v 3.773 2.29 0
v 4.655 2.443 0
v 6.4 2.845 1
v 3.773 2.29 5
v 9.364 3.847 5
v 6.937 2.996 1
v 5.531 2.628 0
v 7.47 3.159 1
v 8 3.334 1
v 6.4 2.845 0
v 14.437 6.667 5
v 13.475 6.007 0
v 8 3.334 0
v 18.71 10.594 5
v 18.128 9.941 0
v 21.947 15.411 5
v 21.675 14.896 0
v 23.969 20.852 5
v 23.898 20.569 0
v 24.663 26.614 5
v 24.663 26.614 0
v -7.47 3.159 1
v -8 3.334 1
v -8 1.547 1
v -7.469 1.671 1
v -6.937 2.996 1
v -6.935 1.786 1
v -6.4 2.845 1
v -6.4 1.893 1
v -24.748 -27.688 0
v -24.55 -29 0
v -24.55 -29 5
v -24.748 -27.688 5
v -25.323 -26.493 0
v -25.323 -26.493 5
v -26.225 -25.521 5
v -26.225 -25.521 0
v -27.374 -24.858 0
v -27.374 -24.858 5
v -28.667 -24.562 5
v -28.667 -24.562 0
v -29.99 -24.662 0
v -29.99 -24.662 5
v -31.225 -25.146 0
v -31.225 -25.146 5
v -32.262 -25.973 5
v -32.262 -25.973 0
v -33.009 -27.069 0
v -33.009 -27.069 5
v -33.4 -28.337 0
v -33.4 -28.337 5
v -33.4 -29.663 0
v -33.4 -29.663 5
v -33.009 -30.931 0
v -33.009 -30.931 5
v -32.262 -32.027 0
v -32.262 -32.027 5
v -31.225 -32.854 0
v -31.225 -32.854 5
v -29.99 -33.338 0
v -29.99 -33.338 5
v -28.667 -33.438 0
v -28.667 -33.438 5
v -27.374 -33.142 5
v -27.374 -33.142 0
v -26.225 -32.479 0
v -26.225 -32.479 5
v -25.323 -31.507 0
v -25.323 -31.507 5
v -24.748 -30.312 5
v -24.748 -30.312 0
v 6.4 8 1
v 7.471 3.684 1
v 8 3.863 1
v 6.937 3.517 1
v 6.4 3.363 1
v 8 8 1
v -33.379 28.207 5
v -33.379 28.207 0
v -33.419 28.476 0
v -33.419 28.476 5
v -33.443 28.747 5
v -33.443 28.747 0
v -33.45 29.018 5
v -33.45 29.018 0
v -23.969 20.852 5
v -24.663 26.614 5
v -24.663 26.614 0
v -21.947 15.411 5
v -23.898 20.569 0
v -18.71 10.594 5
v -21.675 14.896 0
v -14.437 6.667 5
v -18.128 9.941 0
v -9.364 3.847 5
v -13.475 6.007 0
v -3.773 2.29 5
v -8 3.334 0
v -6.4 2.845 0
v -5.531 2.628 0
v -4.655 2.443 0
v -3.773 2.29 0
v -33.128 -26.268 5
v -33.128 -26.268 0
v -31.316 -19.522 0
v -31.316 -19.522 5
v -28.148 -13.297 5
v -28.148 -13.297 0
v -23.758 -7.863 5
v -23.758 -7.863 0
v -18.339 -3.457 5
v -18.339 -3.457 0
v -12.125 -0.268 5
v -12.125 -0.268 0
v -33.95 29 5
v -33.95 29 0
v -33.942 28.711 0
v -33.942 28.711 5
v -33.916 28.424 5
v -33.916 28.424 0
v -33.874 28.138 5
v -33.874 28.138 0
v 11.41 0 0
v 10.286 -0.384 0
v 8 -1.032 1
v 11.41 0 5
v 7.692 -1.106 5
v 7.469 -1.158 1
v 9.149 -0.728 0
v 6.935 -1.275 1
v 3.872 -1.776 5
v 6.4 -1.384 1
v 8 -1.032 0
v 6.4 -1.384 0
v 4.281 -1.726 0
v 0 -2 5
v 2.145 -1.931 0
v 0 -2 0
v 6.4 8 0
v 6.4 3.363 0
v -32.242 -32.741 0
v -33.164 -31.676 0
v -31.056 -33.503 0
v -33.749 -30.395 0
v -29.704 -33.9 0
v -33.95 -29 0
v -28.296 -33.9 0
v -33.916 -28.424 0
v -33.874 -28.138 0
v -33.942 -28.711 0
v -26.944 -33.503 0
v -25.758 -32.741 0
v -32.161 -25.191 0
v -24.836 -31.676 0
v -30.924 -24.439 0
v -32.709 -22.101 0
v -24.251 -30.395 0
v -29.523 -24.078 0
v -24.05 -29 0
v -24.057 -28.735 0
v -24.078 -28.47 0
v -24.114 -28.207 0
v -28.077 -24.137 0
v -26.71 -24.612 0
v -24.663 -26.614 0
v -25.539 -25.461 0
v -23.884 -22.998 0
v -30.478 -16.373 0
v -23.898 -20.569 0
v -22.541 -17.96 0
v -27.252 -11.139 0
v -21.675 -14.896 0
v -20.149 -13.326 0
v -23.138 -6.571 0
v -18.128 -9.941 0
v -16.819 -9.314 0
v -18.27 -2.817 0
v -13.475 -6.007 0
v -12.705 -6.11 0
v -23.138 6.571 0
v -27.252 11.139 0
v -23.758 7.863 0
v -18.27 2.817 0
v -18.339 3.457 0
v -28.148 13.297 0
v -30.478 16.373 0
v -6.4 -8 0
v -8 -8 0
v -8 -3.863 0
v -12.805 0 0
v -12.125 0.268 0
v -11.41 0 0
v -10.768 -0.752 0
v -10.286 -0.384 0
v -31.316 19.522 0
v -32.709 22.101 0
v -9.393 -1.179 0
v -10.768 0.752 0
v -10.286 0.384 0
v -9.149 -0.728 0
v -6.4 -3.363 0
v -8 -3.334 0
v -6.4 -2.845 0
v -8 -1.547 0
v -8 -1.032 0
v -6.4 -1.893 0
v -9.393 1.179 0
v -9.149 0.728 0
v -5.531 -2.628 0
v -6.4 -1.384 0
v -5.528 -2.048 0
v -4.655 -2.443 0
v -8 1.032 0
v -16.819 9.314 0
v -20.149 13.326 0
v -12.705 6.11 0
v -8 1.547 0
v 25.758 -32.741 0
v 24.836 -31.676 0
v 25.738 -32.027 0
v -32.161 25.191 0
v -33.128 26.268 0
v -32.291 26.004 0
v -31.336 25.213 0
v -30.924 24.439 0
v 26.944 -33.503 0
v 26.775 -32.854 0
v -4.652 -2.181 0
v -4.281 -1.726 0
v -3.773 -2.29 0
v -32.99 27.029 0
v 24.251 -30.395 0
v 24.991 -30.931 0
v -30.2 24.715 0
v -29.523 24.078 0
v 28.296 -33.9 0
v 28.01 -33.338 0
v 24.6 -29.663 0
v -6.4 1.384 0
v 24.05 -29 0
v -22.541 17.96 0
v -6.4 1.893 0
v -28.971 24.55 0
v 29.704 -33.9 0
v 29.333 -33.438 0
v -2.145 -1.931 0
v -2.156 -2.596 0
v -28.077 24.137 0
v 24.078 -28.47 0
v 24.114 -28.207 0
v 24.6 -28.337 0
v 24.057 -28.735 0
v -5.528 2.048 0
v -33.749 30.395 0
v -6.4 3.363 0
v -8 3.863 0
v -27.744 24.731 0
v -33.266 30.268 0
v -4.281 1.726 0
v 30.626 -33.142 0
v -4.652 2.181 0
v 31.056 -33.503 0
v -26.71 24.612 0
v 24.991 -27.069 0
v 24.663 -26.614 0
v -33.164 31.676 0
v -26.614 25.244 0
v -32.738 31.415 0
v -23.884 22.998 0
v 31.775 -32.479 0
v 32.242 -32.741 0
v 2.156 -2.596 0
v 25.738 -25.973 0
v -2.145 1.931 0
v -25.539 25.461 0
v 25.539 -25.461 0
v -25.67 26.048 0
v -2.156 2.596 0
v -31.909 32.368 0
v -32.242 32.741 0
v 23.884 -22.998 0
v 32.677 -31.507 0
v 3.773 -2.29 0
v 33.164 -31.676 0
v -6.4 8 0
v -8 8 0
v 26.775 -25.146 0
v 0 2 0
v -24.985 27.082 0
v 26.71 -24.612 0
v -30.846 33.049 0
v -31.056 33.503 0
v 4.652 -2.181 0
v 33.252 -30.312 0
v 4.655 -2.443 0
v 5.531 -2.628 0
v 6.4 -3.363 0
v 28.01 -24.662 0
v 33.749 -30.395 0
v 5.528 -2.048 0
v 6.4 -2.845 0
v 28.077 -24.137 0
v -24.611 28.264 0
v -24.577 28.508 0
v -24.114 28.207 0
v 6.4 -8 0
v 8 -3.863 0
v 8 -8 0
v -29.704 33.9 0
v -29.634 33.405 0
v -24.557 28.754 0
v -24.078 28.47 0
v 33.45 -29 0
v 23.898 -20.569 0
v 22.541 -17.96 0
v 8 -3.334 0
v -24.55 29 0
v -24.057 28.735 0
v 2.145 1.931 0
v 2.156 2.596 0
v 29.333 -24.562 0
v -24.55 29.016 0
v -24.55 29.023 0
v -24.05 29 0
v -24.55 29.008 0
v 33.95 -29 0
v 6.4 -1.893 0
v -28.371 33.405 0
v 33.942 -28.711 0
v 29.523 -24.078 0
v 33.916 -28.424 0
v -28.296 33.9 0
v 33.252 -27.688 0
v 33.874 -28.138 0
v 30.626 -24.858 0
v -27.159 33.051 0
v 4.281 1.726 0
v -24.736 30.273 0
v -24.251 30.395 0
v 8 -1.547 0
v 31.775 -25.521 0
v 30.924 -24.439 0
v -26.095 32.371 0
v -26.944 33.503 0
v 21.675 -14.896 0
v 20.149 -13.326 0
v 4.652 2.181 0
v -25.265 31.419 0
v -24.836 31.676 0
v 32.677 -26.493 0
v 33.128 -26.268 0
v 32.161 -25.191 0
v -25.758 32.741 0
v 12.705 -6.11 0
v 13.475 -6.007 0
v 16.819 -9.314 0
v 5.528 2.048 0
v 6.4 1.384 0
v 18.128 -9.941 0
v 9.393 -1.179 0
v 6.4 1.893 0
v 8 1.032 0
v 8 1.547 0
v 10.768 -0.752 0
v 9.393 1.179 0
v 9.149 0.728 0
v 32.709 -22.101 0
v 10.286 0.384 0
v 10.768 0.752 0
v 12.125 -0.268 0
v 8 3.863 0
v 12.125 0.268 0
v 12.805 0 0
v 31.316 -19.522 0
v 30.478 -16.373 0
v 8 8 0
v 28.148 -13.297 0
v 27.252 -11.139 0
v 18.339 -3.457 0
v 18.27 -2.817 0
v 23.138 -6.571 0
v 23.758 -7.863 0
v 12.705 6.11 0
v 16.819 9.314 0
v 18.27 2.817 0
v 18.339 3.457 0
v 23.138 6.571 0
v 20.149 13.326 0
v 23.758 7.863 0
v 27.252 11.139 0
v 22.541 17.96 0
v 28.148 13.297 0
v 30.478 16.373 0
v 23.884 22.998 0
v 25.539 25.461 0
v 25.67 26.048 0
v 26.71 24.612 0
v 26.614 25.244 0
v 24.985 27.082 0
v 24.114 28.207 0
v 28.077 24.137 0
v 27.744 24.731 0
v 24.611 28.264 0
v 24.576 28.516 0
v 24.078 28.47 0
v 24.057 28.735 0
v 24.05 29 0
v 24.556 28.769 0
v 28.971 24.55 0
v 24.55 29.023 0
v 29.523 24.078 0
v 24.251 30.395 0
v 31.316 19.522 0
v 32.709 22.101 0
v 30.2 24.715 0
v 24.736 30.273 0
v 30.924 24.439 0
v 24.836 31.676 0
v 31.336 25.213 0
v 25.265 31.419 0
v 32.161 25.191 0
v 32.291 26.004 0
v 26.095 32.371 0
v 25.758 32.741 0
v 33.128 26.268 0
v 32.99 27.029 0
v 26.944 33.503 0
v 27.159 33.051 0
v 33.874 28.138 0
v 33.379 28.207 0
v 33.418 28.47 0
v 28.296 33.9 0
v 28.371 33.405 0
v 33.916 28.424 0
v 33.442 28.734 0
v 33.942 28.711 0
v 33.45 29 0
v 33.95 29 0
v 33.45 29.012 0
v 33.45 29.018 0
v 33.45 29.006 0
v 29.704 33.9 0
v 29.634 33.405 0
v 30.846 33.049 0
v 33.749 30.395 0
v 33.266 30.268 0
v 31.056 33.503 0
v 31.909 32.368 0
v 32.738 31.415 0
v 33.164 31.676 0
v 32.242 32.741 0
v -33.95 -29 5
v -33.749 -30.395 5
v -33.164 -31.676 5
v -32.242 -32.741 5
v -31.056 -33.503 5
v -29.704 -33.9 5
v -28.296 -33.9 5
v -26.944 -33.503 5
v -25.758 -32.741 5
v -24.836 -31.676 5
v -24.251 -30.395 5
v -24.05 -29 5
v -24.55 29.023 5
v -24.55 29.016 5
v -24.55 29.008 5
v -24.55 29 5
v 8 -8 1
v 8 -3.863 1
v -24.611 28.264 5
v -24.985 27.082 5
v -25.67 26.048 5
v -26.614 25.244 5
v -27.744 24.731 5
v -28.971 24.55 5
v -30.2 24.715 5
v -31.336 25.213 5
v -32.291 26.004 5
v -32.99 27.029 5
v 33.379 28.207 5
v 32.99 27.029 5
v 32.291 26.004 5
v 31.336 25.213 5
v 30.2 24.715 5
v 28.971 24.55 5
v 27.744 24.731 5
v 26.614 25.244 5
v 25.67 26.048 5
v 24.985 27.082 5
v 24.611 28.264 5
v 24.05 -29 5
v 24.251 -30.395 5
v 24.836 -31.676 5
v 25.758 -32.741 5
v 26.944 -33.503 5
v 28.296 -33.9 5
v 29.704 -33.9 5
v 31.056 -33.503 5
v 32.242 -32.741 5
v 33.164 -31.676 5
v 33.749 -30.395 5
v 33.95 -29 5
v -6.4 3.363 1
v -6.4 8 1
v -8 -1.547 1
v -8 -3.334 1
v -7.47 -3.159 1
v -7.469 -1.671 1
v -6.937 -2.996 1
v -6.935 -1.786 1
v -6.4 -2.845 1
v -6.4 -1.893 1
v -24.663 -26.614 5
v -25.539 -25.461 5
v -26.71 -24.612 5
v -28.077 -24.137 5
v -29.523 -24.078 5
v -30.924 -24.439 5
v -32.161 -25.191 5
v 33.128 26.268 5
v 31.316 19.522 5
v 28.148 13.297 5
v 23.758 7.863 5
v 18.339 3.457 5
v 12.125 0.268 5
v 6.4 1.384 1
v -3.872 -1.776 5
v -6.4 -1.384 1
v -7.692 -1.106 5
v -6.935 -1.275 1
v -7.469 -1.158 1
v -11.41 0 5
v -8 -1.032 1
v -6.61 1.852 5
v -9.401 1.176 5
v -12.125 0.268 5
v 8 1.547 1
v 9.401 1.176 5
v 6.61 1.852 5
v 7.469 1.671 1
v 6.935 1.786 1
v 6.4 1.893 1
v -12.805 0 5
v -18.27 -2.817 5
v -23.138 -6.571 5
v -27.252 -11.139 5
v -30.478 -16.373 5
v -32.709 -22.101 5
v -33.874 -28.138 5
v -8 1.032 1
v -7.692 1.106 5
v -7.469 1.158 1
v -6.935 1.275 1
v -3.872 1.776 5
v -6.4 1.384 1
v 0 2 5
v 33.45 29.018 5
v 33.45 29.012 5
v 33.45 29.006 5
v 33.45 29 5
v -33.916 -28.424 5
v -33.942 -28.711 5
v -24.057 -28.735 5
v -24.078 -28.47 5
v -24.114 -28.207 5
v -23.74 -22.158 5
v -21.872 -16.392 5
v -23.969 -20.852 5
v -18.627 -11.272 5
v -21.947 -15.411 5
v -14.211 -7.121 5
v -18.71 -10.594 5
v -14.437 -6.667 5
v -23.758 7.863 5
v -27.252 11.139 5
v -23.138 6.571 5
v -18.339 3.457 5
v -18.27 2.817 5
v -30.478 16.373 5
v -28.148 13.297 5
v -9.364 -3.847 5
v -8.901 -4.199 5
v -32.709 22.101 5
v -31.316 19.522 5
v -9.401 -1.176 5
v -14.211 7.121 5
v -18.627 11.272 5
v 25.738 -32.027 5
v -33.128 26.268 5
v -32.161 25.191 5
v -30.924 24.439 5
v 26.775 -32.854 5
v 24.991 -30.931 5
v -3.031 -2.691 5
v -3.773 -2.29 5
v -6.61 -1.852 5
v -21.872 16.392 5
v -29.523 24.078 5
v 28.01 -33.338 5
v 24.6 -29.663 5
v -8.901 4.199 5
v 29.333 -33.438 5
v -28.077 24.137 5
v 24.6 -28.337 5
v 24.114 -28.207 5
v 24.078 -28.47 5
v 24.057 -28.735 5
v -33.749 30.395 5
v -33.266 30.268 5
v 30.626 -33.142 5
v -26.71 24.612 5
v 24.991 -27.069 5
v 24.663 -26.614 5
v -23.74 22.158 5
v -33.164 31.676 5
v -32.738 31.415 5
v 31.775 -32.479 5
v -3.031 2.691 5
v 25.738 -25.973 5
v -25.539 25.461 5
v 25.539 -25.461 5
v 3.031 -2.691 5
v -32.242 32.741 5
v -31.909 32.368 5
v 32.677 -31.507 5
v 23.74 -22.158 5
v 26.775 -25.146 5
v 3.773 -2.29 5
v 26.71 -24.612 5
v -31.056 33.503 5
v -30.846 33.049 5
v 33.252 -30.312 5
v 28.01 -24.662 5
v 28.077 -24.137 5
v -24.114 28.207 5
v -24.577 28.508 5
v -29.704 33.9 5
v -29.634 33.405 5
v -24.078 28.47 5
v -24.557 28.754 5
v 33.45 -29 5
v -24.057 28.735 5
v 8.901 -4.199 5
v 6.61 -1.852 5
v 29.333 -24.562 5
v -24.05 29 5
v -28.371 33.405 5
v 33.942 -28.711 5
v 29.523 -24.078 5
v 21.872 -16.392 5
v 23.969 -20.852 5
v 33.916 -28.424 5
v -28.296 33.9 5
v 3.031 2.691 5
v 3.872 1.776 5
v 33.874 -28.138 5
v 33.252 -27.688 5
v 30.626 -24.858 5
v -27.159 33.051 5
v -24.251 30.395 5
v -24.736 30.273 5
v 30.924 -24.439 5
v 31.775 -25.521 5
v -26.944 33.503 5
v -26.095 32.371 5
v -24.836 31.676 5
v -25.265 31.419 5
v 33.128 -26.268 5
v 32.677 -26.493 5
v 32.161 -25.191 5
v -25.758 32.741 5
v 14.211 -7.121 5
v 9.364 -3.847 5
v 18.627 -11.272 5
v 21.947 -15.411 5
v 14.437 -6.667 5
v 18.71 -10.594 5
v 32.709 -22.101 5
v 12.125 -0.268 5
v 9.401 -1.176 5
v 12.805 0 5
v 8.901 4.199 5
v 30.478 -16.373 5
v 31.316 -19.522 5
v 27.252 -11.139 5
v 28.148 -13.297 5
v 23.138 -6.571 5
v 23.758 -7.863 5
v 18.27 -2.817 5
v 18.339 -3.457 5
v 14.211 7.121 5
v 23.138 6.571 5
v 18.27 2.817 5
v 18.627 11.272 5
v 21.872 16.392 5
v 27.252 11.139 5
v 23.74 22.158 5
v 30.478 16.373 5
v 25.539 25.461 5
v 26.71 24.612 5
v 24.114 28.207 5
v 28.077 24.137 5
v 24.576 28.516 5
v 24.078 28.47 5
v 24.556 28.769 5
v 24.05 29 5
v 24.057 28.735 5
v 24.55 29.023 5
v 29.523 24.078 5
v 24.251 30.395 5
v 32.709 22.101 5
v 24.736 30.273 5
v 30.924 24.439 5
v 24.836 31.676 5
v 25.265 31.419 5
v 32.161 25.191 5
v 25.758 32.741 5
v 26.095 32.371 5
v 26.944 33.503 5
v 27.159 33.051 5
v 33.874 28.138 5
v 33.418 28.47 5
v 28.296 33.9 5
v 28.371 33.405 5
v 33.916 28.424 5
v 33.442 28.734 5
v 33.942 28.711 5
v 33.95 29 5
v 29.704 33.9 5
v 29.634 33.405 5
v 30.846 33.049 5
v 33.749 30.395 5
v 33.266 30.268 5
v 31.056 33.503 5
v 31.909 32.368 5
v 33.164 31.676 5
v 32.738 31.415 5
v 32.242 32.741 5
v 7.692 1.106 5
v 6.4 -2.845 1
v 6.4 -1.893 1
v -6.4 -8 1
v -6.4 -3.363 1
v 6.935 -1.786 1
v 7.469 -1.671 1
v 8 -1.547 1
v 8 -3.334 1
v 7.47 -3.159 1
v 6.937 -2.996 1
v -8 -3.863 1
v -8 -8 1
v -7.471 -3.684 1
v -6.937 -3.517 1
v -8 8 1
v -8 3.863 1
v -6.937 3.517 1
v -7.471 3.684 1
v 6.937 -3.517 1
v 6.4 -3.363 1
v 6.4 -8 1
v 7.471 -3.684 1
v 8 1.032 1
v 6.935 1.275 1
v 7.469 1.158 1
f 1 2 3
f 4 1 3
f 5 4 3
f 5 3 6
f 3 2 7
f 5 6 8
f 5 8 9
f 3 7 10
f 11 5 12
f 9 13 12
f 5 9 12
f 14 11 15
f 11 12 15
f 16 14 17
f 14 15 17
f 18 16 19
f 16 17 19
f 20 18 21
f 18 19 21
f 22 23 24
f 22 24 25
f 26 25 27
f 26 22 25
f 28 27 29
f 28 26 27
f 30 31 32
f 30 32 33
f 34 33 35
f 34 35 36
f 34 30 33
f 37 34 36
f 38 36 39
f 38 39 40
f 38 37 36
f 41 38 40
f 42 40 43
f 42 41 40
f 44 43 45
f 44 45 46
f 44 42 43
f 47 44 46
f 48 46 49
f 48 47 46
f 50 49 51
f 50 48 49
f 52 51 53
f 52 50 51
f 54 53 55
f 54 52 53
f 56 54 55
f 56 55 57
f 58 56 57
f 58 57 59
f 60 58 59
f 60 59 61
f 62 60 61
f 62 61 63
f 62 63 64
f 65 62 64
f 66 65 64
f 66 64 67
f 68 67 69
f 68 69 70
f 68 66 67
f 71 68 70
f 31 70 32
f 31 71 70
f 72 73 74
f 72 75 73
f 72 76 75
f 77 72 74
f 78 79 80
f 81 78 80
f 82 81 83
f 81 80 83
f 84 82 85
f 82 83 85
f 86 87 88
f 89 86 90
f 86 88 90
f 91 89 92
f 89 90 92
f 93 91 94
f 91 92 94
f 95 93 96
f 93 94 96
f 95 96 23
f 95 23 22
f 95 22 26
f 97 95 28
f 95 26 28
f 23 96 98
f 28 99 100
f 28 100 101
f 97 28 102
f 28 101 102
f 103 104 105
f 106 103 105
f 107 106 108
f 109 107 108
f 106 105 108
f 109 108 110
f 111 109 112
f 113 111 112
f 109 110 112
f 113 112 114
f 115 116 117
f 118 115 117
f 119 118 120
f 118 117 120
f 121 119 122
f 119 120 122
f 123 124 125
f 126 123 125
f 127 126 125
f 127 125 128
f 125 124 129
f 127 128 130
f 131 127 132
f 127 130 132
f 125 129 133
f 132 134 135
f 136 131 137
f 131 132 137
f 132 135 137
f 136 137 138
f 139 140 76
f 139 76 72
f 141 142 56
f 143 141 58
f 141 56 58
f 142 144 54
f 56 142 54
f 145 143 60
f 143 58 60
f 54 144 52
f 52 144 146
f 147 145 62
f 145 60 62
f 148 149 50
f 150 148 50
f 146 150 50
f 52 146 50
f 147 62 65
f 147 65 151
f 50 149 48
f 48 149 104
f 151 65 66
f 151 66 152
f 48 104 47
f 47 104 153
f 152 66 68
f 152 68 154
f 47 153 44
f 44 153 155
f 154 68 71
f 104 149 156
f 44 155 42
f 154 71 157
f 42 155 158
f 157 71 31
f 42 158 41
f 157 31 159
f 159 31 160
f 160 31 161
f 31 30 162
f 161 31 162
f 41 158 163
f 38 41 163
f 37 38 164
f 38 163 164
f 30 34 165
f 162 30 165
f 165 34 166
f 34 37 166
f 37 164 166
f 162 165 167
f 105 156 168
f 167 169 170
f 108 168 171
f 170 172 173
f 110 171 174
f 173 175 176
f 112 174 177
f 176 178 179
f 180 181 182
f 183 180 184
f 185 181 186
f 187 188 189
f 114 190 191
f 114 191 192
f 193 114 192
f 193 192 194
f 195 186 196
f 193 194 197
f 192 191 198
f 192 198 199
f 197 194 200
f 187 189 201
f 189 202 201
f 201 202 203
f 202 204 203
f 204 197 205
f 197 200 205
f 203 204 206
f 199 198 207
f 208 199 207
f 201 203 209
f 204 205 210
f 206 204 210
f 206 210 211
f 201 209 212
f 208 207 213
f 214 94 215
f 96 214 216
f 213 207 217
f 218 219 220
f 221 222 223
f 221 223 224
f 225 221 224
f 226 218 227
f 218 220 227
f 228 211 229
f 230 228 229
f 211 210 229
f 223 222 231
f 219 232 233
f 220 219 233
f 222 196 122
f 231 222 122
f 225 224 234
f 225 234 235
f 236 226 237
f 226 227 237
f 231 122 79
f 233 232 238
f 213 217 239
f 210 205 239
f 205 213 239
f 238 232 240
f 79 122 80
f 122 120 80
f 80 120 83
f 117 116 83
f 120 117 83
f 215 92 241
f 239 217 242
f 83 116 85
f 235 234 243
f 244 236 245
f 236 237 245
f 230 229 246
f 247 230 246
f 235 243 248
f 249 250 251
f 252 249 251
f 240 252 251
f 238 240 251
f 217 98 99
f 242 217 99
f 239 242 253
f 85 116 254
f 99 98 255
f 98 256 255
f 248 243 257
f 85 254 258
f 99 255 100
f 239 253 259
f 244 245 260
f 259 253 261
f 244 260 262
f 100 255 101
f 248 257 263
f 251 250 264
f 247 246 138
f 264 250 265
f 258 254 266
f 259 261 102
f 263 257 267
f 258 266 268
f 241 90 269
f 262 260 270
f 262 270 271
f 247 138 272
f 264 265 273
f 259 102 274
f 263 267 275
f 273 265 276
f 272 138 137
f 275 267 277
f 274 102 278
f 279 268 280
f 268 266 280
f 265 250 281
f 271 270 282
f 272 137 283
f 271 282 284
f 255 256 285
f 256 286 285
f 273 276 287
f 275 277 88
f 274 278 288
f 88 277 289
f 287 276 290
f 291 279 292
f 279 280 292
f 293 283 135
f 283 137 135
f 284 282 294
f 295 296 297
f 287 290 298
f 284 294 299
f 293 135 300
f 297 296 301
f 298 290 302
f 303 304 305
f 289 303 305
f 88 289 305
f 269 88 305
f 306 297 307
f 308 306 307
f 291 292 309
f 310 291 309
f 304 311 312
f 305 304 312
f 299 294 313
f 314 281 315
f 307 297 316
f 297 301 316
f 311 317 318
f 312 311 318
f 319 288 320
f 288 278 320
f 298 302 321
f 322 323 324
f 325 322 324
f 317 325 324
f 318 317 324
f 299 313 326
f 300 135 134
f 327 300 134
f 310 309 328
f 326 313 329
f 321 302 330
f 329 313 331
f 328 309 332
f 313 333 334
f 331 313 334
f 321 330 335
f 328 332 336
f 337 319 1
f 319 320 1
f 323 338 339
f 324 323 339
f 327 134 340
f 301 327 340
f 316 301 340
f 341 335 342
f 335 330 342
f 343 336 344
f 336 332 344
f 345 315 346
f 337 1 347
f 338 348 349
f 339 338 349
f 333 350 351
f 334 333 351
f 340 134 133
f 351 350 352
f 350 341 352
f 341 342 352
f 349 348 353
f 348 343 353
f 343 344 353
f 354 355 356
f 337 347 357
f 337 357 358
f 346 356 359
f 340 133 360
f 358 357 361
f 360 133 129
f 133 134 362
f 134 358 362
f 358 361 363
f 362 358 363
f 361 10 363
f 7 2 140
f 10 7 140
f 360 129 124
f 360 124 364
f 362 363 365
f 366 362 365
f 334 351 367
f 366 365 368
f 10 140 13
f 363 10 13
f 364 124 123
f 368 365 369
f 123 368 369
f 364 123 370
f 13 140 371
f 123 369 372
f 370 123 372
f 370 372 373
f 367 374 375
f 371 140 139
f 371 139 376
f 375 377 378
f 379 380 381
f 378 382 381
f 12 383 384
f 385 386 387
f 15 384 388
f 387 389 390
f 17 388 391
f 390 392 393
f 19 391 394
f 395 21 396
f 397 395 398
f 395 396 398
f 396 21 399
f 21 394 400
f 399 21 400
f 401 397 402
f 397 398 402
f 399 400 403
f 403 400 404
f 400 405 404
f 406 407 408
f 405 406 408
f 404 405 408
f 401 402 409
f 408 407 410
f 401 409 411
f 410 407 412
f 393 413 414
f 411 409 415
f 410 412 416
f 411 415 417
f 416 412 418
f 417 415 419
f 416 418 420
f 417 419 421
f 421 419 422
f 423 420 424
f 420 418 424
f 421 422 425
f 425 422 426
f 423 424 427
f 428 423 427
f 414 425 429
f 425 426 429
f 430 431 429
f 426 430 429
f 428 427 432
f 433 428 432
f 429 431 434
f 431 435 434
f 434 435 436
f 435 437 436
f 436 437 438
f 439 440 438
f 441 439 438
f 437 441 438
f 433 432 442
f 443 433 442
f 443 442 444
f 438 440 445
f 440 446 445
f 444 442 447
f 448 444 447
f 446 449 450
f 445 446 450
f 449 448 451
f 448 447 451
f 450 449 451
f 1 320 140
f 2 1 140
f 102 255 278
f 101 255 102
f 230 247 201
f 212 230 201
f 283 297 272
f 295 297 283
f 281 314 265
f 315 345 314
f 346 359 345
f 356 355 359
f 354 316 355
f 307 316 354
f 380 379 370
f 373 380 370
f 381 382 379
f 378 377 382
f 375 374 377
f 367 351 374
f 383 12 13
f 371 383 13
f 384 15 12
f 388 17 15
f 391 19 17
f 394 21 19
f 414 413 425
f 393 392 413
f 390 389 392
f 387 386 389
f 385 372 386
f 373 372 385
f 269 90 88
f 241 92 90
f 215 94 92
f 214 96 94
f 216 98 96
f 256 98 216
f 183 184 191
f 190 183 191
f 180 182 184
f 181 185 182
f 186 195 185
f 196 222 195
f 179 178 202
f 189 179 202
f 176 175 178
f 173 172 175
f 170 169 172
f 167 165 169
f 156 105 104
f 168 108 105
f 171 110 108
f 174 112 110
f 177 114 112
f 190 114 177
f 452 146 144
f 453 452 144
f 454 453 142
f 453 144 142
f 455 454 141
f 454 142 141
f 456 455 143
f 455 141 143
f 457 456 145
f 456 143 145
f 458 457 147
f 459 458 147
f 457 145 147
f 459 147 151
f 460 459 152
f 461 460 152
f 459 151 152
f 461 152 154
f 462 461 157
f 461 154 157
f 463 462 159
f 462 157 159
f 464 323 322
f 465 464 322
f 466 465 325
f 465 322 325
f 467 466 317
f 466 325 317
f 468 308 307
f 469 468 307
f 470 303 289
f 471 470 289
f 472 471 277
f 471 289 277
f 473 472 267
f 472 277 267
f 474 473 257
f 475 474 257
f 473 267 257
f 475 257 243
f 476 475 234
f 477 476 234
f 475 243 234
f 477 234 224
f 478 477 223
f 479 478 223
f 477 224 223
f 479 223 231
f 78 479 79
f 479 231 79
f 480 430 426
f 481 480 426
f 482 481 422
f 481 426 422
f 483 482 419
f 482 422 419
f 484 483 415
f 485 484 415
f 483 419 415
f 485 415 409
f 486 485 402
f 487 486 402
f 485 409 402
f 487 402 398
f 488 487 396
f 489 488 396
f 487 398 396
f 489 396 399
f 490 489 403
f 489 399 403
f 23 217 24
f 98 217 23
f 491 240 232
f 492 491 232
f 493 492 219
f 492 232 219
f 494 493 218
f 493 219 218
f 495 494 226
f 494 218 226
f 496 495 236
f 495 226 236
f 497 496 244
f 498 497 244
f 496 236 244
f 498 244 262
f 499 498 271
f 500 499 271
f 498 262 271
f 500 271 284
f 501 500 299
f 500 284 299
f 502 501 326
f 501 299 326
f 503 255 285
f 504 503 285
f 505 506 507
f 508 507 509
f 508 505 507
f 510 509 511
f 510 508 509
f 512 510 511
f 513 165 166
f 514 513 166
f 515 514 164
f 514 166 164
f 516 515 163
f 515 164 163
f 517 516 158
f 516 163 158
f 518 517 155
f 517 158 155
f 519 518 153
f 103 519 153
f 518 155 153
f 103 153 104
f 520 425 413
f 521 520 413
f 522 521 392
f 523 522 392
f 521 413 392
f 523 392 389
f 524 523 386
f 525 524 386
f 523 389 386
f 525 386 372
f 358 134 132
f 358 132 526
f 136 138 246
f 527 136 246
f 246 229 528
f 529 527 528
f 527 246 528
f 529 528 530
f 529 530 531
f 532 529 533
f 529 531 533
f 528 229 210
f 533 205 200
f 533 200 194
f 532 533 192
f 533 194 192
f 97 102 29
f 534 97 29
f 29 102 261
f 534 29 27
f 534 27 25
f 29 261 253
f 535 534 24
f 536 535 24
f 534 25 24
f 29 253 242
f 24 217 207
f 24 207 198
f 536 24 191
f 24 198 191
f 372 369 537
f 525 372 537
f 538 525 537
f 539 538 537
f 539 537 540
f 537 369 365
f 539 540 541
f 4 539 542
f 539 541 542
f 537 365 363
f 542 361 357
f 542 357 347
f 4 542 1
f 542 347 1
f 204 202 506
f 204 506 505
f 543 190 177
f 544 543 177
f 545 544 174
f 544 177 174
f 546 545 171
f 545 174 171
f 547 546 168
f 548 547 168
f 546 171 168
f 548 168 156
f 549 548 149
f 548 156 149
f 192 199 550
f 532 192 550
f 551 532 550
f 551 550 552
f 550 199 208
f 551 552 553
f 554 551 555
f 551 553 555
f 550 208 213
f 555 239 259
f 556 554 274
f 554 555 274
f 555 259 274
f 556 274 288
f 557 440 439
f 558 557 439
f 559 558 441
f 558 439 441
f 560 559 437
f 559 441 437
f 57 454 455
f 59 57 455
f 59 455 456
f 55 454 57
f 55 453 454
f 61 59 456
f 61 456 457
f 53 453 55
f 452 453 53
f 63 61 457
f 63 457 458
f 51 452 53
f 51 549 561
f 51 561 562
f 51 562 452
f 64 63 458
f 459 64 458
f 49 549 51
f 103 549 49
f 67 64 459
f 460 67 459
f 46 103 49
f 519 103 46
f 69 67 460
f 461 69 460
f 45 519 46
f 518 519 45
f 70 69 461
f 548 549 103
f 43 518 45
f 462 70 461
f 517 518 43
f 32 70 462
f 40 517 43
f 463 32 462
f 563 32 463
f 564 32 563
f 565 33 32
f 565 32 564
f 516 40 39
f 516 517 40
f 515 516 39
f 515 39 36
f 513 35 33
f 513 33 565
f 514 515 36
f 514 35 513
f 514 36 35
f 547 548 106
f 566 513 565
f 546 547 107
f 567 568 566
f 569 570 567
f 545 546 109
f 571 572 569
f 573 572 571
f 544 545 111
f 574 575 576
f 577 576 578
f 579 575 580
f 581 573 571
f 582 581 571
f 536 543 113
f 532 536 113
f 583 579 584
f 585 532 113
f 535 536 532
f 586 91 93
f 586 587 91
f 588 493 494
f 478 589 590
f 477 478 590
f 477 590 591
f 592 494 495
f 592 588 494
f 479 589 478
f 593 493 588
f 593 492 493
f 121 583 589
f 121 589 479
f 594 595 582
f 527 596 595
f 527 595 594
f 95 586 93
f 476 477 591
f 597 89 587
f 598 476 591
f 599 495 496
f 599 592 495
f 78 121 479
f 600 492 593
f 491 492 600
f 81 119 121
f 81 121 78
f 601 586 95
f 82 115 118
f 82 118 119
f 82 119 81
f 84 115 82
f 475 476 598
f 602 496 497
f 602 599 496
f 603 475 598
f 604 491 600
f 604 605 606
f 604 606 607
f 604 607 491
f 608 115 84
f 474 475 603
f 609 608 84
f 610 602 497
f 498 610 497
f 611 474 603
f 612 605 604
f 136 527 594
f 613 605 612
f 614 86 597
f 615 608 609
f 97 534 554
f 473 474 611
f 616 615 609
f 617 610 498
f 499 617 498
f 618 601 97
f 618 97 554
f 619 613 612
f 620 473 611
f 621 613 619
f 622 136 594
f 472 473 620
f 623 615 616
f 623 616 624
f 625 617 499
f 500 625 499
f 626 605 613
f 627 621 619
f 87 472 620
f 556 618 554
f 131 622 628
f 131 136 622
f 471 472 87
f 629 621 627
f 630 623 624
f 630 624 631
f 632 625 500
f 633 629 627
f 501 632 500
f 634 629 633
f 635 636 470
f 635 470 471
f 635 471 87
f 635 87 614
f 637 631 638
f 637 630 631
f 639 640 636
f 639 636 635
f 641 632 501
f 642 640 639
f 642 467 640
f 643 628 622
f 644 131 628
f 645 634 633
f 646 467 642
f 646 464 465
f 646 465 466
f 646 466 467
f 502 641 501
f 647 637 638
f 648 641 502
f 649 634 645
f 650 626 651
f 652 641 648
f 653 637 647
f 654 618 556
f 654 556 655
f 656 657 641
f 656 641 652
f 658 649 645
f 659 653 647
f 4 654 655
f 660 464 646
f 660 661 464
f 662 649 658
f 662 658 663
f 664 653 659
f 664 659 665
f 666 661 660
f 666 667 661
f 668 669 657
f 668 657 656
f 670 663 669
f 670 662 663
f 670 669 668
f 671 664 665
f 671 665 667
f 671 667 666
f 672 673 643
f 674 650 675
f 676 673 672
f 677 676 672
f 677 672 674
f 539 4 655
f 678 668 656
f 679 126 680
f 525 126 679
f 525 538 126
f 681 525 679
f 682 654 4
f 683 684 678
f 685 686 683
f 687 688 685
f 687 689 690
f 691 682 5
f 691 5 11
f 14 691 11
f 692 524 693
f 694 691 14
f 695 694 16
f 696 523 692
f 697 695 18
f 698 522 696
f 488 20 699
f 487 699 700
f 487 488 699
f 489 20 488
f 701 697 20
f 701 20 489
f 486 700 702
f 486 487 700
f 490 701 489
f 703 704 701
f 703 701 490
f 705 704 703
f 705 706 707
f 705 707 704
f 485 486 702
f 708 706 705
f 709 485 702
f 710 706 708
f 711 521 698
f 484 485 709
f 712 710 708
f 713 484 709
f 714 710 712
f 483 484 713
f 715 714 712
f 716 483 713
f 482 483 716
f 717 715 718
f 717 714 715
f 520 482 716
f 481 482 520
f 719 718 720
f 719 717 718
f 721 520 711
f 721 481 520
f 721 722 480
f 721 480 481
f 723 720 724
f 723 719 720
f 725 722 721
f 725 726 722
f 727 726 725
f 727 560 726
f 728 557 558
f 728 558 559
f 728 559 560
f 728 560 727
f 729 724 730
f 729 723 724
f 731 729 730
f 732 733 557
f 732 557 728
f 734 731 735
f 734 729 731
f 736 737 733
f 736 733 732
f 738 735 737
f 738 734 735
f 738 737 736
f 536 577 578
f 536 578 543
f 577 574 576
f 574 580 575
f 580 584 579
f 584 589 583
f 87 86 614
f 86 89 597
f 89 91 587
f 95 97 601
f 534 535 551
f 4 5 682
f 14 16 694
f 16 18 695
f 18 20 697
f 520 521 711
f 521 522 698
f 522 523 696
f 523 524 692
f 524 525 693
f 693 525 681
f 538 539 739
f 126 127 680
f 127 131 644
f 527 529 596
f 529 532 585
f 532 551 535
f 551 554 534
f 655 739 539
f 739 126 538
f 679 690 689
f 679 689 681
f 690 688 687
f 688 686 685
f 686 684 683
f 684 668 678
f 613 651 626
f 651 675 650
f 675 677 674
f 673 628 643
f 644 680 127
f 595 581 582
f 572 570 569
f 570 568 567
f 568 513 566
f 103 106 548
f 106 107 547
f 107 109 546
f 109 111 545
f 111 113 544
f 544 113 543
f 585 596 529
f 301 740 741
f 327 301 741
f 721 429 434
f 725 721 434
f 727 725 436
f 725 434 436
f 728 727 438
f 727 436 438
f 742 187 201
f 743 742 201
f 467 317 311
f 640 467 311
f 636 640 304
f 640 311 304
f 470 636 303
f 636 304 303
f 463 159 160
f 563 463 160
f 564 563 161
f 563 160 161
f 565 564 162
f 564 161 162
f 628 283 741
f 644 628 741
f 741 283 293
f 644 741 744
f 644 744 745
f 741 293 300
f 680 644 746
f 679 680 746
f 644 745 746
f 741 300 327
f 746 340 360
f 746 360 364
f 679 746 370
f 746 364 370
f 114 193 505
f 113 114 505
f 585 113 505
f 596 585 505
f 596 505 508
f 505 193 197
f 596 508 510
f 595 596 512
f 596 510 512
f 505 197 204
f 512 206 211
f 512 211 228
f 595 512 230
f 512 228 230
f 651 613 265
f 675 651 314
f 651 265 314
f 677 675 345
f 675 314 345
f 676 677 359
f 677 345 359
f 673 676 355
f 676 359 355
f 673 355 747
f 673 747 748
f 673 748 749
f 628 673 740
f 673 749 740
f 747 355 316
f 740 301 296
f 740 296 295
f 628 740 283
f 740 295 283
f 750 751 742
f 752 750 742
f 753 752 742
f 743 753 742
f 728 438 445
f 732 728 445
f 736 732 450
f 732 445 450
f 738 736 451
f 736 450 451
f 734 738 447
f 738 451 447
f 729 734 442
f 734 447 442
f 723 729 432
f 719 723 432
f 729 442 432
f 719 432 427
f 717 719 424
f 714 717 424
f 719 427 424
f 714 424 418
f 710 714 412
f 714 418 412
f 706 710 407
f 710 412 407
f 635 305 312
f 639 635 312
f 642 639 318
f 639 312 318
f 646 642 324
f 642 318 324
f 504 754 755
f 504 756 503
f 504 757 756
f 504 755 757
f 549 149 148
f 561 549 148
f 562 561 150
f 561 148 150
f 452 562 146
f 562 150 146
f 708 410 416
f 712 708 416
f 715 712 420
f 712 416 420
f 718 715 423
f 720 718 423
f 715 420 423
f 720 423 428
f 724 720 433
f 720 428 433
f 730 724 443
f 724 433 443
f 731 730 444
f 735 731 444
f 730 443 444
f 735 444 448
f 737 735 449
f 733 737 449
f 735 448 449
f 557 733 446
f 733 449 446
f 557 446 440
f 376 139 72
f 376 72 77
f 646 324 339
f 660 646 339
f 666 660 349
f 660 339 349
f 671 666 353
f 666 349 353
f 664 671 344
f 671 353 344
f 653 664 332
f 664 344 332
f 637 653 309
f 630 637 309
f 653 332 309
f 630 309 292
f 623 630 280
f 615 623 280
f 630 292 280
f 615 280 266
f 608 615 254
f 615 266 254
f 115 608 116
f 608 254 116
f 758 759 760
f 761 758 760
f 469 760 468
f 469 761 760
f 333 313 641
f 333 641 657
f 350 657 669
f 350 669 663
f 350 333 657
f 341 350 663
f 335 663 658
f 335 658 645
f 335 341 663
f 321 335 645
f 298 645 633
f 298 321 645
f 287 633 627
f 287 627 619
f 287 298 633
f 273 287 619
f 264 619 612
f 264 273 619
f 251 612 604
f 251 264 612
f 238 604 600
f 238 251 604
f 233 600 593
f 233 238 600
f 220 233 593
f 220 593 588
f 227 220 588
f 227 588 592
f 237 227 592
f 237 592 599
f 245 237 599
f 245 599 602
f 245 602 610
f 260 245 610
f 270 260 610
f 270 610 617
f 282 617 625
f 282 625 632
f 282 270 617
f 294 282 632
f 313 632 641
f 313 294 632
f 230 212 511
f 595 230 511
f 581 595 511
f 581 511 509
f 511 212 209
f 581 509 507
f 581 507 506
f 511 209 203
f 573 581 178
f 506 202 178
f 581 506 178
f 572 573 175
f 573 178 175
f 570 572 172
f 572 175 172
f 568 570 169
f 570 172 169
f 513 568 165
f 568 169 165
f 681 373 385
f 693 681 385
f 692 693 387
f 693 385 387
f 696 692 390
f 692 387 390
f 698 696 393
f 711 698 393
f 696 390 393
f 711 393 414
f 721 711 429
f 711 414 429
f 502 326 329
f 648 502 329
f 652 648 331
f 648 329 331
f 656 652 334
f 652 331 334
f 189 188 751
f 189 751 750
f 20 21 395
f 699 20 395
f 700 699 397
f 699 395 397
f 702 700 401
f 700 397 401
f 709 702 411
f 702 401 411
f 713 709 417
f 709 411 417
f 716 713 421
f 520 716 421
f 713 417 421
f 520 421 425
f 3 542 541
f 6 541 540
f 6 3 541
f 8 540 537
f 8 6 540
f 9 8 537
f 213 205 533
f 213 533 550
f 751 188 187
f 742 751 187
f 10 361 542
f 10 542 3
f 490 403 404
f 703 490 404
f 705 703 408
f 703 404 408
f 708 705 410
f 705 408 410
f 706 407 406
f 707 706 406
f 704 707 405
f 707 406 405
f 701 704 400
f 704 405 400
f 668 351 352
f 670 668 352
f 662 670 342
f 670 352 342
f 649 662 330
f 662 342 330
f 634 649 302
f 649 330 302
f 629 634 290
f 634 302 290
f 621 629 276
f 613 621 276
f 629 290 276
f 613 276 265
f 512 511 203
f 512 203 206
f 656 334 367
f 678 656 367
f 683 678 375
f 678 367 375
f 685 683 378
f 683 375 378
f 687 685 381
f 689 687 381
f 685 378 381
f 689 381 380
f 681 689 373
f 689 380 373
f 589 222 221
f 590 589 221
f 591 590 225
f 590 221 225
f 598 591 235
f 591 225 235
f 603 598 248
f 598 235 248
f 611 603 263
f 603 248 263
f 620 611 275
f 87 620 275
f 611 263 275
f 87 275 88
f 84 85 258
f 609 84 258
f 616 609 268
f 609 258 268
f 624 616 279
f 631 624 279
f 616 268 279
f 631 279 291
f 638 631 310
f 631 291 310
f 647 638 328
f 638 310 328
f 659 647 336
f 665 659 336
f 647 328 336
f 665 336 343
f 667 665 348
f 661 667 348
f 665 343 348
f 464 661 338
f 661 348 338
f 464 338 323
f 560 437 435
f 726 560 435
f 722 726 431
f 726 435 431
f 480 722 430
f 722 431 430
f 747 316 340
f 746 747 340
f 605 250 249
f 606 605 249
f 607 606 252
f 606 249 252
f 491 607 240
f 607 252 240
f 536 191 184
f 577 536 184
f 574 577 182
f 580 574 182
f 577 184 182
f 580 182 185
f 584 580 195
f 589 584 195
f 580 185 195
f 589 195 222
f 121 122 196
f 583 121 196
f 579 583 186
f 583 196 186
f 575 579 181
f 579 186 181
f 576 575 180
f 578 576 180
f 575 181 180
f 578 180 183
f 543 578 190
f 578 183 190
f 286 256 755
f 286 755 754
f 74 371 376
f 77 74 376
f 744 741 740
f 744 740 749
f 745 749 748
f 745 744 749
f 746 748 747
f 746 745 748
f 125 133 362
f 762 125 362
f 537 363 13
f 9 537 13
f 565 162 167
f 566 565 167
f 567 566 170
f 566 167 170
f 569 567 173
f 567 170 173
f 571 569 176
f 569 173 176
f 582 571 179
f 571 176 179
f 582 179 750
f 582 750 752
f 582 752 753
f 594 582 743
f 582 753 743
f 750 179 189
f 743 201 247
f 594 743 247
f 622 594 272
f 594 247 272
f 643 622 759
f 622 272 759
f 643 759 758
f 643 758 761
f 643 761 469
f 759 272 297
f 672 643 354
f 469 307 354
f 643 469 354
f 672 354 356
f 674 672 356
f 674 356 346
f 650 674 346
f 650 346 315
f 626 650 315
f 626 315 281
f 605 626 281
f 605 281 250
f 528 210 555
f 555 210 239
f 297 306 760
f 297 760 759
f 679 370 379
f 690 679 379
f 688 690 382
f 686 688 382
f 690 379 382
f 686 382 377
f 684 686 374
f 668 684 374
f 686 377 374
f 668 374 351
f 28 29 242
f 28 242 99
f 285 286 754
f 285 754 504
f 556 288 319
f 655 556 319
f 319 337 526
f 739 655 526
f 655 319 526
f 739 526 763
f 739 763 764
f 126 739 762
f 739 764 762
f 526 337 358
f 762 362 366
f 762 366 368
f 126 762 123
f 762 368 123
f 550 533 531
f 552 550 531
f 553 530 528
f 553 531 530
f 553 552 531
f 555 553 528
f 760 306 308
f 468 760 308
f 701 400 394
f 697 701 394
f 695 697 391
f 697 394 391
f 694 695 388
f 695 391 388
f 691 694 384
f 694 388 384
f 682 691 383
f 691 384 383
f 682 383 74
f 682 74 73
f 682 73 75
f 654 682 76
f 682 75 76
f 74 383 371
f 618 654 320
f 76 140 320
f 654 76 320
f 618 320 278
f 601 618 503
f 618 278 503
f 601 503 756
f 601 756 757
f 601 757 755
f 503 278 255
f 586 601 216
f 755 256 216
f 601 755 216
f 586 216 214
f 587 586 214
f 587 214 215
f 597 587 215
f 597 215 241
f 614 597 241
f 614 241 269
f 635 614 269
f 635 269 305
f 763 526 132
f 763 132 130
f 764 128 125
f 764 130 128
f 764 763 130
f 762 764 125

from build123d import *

# Parameters (mm, degrees)
F0_R     = 4.45
F1_DEPTH = 5
F2_W     = 1.6
F2_H     = 16
F3_DEPTH = 1


with BuildPart() as f1:
    # F0 (on Top) → F1 (new body)
    with BuildSketch(Plane.XY):
        with BuildLine():
            ThreePointArc((-12.1246449961, 0.267831512), (-26.0947437129, 10.4656664971), (-33.1275013965, 26.2675592921))
            ThreePointArc((-33.1275013965, 26.2675592921), (-28.7977769223, 24.0541324495), (-24.6632048151, 26.6136413673))
            ThreePointArc((-24.6632048151, 26.6136413673), (-18.7098814469, 10.5941393251), (-3.7729248553, 2.2902948789))
            ThreePointArc((-3.7729248553, 2.2902948789), (-1.8893740867, 2.4475332935), (5.87e-08, 2.5))
            ThreePointArc((5.87e-08, 2.5), (-17.6234951757, 10.132214329), (-24.1138632932, 28.2074294465))
            ThreePointArc((-24.1138632932, 28.2074294465), (-24.0851920036, 28.6039774344), (-24.05, 29))
            ThreePointArc((-24.05, 29), (-29, 33.95), (-33.95, 29))
            ThreePointArc((-33.95, 29), (-33.914900783, 28.5686280089), (-33.8743207345, 28.1377370604))
            ThreePointArc((-33.8743207345, 28.1377370604), (-27.2521637698, 11.1393838049), (-12.8053265827, 0))
            ThreePointArc((-12.8053265827, 0), (-12.4657051208, 0.1357439041), (-12.1246449961, 0.267831512))
        make_face()
        with BuildLine():
            ThreePointArc((-24.6112307284, 28.2643341244), (-28.9708151416, 24.5500957039), (-33.3787423598, 28.206832082))
            ThreePointArc((-33.3787423598, 28.206832082), (-33.4329586461, 28.6109272024), (-33.4499624194, 29.0182883979))
            ThreePointArc((-33.4499624194, 29.0182883979), (-29.0025886323, 33.4499992471), (-24.5500618695, 29.0234656056))
            ThreePointArc((-24.5500618695, 29.0234656056), (-24.5500154674, 29.0117328436), (-24.55, 29))
            ThreePointArc((-24.55, 29), (-24.5653341017, 28.6308951766), (-24.6112307284, 28.2643341244))
        make_face(mode=Mode.SUBTRACT)
        with BuildLine():
            ThreePointArc((-11.4096937343, 0), (-11.7679313517, 0.131881704), (-12.1246449961, 0.267831512))
            ThreePointArc((-12.1246449961, 0.267831512), (-12.4657051208, 0.1357439041), (-12.8053265827, 0))
            ThreePointArc((-12.8053265827, 0), (-12.4657051208, -0.1357439041), (-12.1246449961, -0.267831512))
            ThreePointArc((-12.1246449961, -0.267831512), (-11.7679313517, -0.131881704), (-11.4096937343, 0))
        make_face()
        with BuildLine():
            ThreePointArc((5.87e-08, 2.5), (-1.8893740867, 2.4475332935), (-3.7729248553, 2.2902948789))
            ThreePointArc((-3.7729248553, 2.2902948789), (-1.8920380566, 2.0726808069), (1.392e-07, 2))
            ThreePointArc((1.392e-07, 2), (1.8920381954, 2.0726808176), (3.7729248553, 2.2902948789))
            ThreePointArc((3.7729248553, 2.2902948789), (1.8893741454, 2.4475332902), (5.87e-08, 2.5))
        make_face()
        with BuildLine():
            ThreePointArc((-12.1246449961, -0.267831512), (-12.4657051208, -0.1357439041), (-12.8053265827, 0))
            ThreePointArc((-12.8053265827, 0), (-27.2521637698, -11.1393838049), (-33.8743207345, -28.1377370604))
            ThreePointArc((-33.8743207345, -28.1377370604), (-33.914900783, -28.5686280089), (-33.95, -29))
            ThreePointArc((-33.95, -29), (-29, -33.95), (-24.05, -29))
            ThreePointArc((-24.05, -29), (-24.0851920036, -28.6039774344), (-24.1138632932, -28.2074294465))
            ThreePointArc((-24.1138632932, -28.2074294465), (-17.6234951757, -10.132214329), (5.87e-08, -2.5))
            ThreePointArc((5.87e-08, -2.5), (-1.8893740867, -2.4475332935), (-3.7729248553, -2.2902948789))
            ThreePointArc((-3.7729248553, -2.2902948789), (-18.7098814469, -10.5941393251), (-24.6632048151, -26.6136413673))
            ThreePointArc((-24.6632048151, -26.6136413673), (-28.7977769223, -24.0541324495), (-33.1275013965, -26.2675592921))
            ThreePointArc((-33.1275013965, -26.2675592921), (-26.0947437129, -10.4656664971), (-12.1246449961, -0.267831512))
        make_face()
        with Locations((-29, -29)):
            Circle(F0_R, mode=Mode.SUBTRACT)
        with BuildLine():
            ThreePointArc((24.1138632932, 28.2074294465), (17.6234952159, 10.1322143718), (5.87e-08, 2.5))
            ThreePointArc((5.87e-08, 2.5), (1.8893741454, 2.4475332902), (3.7729248553, 2.2902948789))
            ThreePointArc((3.7729248553, 2.2902948789), (18.7098814469, 10.5941393251), (24.6632048151, 26.6136413673))
            ThreePointArc((24.6632048151, 26.6136413673), (28.7977769223, 24.0541324495), (33.1275013965, 26.2675592921))
            ThreePointArc((33.1275013965, 26.2675592921), (26.0947437129, 10.4656664971), (12.1246449961, 0.267831512))
            ThreePointArc((12.1246449961, 0.267831512), (12.4657051208, 0.1357439041), (12.8053265827, 0))
            ThreePointArc((12.8053265827, 0), (27.2521637698, 11.1393838049), (33.8743207345, 28.1377370604))
            ThreePointArc((33.8743207345, 28.1377370604), (33.914900783, 28.5686280089), (33.95, 29))
            ThreePointArc((33.95, 29), (29, 33.95), (24.05, 29))
            ThreePointArc((24.05, 29), (24.0851920036, 28.6039774344), (24.1138632932, 28.2074294465))
        make_face()
        with BuildLine():
            ThreePointArc((33.3787423598, 28.206832082), (28.9708151416, 24.5500957039), (24.6112307284, 28.2643341244))
            ThreePointArc((24.6112307284, 28.2643341244), (24.5643763362, 28.6425888733), (24.5500618695, 29.0234656056))
            ThreePointArc((24.5500618695, 29.0234656056), (29.0025886323, 33.4499992471), (33.4499624194, 29.0182883979))
            ThreePointArc((33.4499624194, 29.0182883979), (33.4499906049, 29.0091442183), (33.45, 29))
            ThreePointArc((33.45, 29), (33.4321497888, 28.6018188235), (33.3787423598, 28.206832082))
        make_face(mode=Mode.SUBTRACT)
        with BuildLine():
            ThreePointArc((3.7729248553, -2.2902948789), (1.8920381954, -2.0726808176), (1.392e-07, -2))
            ThreePointArc((1.392e-07, -2), (-1.8920380566, -2.0726808069), (-3.7729248553, -2.2902948789))
            ThreePointArc((-3.7729248553, -2.2902948789), (-1.8893740867, -2.4475332935), (5.87e-08, -2.5))
            ThreePointArc((5.87e-08, -2.5), (1.8893741454, -2.4475332902), (3.7729248553, -2.2902948789))
        make_face()
        with BuildLine():
            ThreePointArc((-33.95, 29), (-33.9310438872, 28.5672111577), (-33.8743207345, 28.1377370604))
            ThreePointArc((-33.8743207345, 28.1377370604), (-33.914900783, 28.5686280089), (-33.95, 29))
        make_face()
        with BuildLine():
            ThreePointArc((-33.95, -29), (-33.914900783, -28.5686280089), (-33.8743207345, -28.1377370604))
            ThreePointArc((-33.8743207345, -28.1377370604), (-33.9310438872, -28.5672111577), (-33.95, -29))
        make_face()
        with BuildLine():
            ThreePointArc((12.1246449961, 0.267831512), (11.7679313517, 0.131881704), (11.4096937343, 0))
            ThreePointArc((11.4096937343, 0), (11.7679313517, -0.131881704), (12.1246449961, -0.267831512))
            ThreePointArc((12.1246449961, -0.267831512), (12.4657051208, -0.1357439041), (12.8053265827, 0))
            ThreePointArc((12.8053265827, 0), (12.4657051208, 0.1357439041), (12.1246449961, 0.267831512))
        make_face()
        with BuildLine():
            ThreePointArc((-24.05, 29), (-24.0851920036, 28.6039774344), (-24.1138632932, 28.2074294465))
            ThreePointArc((-24.1138632932, 28.2074294465), (-24.0659916549, 28.6024303198), (-24.05, 29))
        make_face()
        with BuildLine():
            ThreePointArc((24.05, 29), (24.0659916549, 28.6024303198), (24.1138632932, 28.2074294465))
            ThreePointArc((24.1138632932, 28.2074294465), (24.0851920036, 28.6039774344), (24.05, 29))
        make_face()
        with BuildLine():
            ThreePointArc((24.6632048151, -26.6136413673), (18.7098814469, -10.5941393251), (3.7729248553, -2.2902948789))
            ThreePointArc((3.7729248553, -2.2902948789), (1.8893741454, -2.4475332902), (5.87e-08, -2.5))
            ThreePointArc((5.87e-08, -2.5), (17.6234952159, -10.1322143718), (24.1138632932, -28.2074294465))
            ThreePointArc((24.1138632932, -28.2074294465), (24.0851920036, -28.6039774344), (24.05, -29))
            ThreePointArc((24.05, -29), (29, -33.95), (33.95, -29))
            ThreePointArc((33.95, -29), (33.914900783, -28.5686280089), (33.8743207345, -28.1377370604))
            ThreePointArc((33.8743207345, -28.1377370604), (27.2521637698, -11.1393838049), (12.8053265827, 0))
            ThreePointArc((12.8053265827, 0), (12.4657051208, -0.1357439041), (12.1246449961, -0.267831512))
            ThreePointArc((12.1246449961, -0.267831512), (26.0947437129, -10.4656664971), (33.1275013965, -26.2675592921))
            ThreePointArc((33.1275013965, -26.2675592921), (28.7977769223, -24.0541324495), (24.6632048151, -26.6136413673))
        make_face()
        with Locations((29, -29)):
            Circle(F0_R, mode=Mode.SUBTRACT)
        with BuildLine():
            ThreePointArc((-24.1138632932, -28.2074294465), (-24.0851920036, -28.6039774344), (-24.05, -29))
            ThreePointArc((-24.05, -29), (-24.0659916549, -28.6024303198), (-24.1138632932, -28.2074294465))
        make_face()
        with BuildLine():
            ThreePointArc((33.8743207345, 28.1377370604), (33.9310438872, 28.5672111577), (33.95, 29))
            ThreePointArc((33.95, 29), (33.914900783, 28.5686280089), (33.8743207345, 28.1377370604))
        make_face()
        with BuildLine():
            ThreePointArc((24.05, -29), (24.0851920036, -28.6039774344), (24.1138632932, -28.2074294465))
            ThreePointArc((24.1138632932, -28.2074294465), (24.0659916549, -28.6024303198), (24.05, -29))
        make_face()
        with BuildLine():
            ThreePointArc((33.95, -29), (33.9310438872, -28.5672111577), (33.8743207345, -28.1377370604))
            ThreePointArc((33.8743207345, -28.1377370604), (33.914900783, -28.5686280089), (33.95, -29))
        make_face()
        with BuildLine():
            ThreePointArc((-3.7729248553, 2.2902948789), (-8.0128503863, 1.5436201739), (-12.1246449961, 0.267831512))
            ThreePointArc((-12.1246449961, 0.267831512), (-11.7679313517, 0.131881704), (-11.4096937343, 0))
            ThreePointArc((-11.4096937343, 0), (-5.7918284664, 1.4962171068), (1.392e-07, 2))
            ThreePointArc((1.392e-07, 2), (-1.8920380566, 2.0726808069), (-3.7729248553, 2.2902948789))
        make_face()
        with BuildLine():
            ThreePointArc((1.392e-07, -2), (-5.7918284664, -1.4962171068), (-11.4096937343, 0))
            ThreePointArc((-11.4096937343, 0), (-11.7679313517, -0.131881704), (-12.1246449961, -0.267831512))
            ThreePointArc((-12.1246449961, -0.267831512), (-8.0128503863, -1.5436201739), (-3.7729248553, -2.2902948789))
            ThreePointArc((-3.7729248553, -2.2902948789), (-1.8920380566, -2.0726808069), (1.392e-07, -2))
        make_face()
        with BuildLine():
            ThreePointArc((11.4096937343, 0), (5.7918286035, -1.4962170827), (1.392e-07, -2))
            ThreePointArc((1.392e-07, -2), (1.8920381954, -2.0726808176), (3.7729248553, -2.2902948789))
            ThreePointArc((3.7729248553, -2.2902948789), (8.0128503863, -1.5436201739), (12.1246449961, -0.267831512))
            ThreePointArc((12.1246449961, -0.267831512), (11.7679313517, -0.131881704), (11.4096937343, 0))
        make_face()
        with BuildLine():
            ThreePointArc((3.7729248553, 2.2902948789), (1.8920381954, 2.0726808176), (1.392e-07, 2))
            ThreePointArc((1.392e-07, 2), (5.7918286035, 1.4962170827), (11.4096937343, 0))
            ThreePointArc((11.4096937343, 0), (11.7679313517, 0.131881704), (12.1246449961, 0.267831512))
            ThreePointArc((12.1246449961, 0.267831512), (8.0128503863, 1.5436201739), (3.7729248553, 2.2902948789))
        make_face()
    extrude(amount=F1_DEPTH)

    # F2 (on Top) → F3 (join)
    with BuildSketch(Plane.XY):
        with Locations((7.2, 0)):
            Rectangle(F2_W, F2_H)
        with Locations((-7.2, 0)):
            Rectangle(F2_W, F2_H)
    extrude(amount=F3_DEPTH)


solid = f1.part
